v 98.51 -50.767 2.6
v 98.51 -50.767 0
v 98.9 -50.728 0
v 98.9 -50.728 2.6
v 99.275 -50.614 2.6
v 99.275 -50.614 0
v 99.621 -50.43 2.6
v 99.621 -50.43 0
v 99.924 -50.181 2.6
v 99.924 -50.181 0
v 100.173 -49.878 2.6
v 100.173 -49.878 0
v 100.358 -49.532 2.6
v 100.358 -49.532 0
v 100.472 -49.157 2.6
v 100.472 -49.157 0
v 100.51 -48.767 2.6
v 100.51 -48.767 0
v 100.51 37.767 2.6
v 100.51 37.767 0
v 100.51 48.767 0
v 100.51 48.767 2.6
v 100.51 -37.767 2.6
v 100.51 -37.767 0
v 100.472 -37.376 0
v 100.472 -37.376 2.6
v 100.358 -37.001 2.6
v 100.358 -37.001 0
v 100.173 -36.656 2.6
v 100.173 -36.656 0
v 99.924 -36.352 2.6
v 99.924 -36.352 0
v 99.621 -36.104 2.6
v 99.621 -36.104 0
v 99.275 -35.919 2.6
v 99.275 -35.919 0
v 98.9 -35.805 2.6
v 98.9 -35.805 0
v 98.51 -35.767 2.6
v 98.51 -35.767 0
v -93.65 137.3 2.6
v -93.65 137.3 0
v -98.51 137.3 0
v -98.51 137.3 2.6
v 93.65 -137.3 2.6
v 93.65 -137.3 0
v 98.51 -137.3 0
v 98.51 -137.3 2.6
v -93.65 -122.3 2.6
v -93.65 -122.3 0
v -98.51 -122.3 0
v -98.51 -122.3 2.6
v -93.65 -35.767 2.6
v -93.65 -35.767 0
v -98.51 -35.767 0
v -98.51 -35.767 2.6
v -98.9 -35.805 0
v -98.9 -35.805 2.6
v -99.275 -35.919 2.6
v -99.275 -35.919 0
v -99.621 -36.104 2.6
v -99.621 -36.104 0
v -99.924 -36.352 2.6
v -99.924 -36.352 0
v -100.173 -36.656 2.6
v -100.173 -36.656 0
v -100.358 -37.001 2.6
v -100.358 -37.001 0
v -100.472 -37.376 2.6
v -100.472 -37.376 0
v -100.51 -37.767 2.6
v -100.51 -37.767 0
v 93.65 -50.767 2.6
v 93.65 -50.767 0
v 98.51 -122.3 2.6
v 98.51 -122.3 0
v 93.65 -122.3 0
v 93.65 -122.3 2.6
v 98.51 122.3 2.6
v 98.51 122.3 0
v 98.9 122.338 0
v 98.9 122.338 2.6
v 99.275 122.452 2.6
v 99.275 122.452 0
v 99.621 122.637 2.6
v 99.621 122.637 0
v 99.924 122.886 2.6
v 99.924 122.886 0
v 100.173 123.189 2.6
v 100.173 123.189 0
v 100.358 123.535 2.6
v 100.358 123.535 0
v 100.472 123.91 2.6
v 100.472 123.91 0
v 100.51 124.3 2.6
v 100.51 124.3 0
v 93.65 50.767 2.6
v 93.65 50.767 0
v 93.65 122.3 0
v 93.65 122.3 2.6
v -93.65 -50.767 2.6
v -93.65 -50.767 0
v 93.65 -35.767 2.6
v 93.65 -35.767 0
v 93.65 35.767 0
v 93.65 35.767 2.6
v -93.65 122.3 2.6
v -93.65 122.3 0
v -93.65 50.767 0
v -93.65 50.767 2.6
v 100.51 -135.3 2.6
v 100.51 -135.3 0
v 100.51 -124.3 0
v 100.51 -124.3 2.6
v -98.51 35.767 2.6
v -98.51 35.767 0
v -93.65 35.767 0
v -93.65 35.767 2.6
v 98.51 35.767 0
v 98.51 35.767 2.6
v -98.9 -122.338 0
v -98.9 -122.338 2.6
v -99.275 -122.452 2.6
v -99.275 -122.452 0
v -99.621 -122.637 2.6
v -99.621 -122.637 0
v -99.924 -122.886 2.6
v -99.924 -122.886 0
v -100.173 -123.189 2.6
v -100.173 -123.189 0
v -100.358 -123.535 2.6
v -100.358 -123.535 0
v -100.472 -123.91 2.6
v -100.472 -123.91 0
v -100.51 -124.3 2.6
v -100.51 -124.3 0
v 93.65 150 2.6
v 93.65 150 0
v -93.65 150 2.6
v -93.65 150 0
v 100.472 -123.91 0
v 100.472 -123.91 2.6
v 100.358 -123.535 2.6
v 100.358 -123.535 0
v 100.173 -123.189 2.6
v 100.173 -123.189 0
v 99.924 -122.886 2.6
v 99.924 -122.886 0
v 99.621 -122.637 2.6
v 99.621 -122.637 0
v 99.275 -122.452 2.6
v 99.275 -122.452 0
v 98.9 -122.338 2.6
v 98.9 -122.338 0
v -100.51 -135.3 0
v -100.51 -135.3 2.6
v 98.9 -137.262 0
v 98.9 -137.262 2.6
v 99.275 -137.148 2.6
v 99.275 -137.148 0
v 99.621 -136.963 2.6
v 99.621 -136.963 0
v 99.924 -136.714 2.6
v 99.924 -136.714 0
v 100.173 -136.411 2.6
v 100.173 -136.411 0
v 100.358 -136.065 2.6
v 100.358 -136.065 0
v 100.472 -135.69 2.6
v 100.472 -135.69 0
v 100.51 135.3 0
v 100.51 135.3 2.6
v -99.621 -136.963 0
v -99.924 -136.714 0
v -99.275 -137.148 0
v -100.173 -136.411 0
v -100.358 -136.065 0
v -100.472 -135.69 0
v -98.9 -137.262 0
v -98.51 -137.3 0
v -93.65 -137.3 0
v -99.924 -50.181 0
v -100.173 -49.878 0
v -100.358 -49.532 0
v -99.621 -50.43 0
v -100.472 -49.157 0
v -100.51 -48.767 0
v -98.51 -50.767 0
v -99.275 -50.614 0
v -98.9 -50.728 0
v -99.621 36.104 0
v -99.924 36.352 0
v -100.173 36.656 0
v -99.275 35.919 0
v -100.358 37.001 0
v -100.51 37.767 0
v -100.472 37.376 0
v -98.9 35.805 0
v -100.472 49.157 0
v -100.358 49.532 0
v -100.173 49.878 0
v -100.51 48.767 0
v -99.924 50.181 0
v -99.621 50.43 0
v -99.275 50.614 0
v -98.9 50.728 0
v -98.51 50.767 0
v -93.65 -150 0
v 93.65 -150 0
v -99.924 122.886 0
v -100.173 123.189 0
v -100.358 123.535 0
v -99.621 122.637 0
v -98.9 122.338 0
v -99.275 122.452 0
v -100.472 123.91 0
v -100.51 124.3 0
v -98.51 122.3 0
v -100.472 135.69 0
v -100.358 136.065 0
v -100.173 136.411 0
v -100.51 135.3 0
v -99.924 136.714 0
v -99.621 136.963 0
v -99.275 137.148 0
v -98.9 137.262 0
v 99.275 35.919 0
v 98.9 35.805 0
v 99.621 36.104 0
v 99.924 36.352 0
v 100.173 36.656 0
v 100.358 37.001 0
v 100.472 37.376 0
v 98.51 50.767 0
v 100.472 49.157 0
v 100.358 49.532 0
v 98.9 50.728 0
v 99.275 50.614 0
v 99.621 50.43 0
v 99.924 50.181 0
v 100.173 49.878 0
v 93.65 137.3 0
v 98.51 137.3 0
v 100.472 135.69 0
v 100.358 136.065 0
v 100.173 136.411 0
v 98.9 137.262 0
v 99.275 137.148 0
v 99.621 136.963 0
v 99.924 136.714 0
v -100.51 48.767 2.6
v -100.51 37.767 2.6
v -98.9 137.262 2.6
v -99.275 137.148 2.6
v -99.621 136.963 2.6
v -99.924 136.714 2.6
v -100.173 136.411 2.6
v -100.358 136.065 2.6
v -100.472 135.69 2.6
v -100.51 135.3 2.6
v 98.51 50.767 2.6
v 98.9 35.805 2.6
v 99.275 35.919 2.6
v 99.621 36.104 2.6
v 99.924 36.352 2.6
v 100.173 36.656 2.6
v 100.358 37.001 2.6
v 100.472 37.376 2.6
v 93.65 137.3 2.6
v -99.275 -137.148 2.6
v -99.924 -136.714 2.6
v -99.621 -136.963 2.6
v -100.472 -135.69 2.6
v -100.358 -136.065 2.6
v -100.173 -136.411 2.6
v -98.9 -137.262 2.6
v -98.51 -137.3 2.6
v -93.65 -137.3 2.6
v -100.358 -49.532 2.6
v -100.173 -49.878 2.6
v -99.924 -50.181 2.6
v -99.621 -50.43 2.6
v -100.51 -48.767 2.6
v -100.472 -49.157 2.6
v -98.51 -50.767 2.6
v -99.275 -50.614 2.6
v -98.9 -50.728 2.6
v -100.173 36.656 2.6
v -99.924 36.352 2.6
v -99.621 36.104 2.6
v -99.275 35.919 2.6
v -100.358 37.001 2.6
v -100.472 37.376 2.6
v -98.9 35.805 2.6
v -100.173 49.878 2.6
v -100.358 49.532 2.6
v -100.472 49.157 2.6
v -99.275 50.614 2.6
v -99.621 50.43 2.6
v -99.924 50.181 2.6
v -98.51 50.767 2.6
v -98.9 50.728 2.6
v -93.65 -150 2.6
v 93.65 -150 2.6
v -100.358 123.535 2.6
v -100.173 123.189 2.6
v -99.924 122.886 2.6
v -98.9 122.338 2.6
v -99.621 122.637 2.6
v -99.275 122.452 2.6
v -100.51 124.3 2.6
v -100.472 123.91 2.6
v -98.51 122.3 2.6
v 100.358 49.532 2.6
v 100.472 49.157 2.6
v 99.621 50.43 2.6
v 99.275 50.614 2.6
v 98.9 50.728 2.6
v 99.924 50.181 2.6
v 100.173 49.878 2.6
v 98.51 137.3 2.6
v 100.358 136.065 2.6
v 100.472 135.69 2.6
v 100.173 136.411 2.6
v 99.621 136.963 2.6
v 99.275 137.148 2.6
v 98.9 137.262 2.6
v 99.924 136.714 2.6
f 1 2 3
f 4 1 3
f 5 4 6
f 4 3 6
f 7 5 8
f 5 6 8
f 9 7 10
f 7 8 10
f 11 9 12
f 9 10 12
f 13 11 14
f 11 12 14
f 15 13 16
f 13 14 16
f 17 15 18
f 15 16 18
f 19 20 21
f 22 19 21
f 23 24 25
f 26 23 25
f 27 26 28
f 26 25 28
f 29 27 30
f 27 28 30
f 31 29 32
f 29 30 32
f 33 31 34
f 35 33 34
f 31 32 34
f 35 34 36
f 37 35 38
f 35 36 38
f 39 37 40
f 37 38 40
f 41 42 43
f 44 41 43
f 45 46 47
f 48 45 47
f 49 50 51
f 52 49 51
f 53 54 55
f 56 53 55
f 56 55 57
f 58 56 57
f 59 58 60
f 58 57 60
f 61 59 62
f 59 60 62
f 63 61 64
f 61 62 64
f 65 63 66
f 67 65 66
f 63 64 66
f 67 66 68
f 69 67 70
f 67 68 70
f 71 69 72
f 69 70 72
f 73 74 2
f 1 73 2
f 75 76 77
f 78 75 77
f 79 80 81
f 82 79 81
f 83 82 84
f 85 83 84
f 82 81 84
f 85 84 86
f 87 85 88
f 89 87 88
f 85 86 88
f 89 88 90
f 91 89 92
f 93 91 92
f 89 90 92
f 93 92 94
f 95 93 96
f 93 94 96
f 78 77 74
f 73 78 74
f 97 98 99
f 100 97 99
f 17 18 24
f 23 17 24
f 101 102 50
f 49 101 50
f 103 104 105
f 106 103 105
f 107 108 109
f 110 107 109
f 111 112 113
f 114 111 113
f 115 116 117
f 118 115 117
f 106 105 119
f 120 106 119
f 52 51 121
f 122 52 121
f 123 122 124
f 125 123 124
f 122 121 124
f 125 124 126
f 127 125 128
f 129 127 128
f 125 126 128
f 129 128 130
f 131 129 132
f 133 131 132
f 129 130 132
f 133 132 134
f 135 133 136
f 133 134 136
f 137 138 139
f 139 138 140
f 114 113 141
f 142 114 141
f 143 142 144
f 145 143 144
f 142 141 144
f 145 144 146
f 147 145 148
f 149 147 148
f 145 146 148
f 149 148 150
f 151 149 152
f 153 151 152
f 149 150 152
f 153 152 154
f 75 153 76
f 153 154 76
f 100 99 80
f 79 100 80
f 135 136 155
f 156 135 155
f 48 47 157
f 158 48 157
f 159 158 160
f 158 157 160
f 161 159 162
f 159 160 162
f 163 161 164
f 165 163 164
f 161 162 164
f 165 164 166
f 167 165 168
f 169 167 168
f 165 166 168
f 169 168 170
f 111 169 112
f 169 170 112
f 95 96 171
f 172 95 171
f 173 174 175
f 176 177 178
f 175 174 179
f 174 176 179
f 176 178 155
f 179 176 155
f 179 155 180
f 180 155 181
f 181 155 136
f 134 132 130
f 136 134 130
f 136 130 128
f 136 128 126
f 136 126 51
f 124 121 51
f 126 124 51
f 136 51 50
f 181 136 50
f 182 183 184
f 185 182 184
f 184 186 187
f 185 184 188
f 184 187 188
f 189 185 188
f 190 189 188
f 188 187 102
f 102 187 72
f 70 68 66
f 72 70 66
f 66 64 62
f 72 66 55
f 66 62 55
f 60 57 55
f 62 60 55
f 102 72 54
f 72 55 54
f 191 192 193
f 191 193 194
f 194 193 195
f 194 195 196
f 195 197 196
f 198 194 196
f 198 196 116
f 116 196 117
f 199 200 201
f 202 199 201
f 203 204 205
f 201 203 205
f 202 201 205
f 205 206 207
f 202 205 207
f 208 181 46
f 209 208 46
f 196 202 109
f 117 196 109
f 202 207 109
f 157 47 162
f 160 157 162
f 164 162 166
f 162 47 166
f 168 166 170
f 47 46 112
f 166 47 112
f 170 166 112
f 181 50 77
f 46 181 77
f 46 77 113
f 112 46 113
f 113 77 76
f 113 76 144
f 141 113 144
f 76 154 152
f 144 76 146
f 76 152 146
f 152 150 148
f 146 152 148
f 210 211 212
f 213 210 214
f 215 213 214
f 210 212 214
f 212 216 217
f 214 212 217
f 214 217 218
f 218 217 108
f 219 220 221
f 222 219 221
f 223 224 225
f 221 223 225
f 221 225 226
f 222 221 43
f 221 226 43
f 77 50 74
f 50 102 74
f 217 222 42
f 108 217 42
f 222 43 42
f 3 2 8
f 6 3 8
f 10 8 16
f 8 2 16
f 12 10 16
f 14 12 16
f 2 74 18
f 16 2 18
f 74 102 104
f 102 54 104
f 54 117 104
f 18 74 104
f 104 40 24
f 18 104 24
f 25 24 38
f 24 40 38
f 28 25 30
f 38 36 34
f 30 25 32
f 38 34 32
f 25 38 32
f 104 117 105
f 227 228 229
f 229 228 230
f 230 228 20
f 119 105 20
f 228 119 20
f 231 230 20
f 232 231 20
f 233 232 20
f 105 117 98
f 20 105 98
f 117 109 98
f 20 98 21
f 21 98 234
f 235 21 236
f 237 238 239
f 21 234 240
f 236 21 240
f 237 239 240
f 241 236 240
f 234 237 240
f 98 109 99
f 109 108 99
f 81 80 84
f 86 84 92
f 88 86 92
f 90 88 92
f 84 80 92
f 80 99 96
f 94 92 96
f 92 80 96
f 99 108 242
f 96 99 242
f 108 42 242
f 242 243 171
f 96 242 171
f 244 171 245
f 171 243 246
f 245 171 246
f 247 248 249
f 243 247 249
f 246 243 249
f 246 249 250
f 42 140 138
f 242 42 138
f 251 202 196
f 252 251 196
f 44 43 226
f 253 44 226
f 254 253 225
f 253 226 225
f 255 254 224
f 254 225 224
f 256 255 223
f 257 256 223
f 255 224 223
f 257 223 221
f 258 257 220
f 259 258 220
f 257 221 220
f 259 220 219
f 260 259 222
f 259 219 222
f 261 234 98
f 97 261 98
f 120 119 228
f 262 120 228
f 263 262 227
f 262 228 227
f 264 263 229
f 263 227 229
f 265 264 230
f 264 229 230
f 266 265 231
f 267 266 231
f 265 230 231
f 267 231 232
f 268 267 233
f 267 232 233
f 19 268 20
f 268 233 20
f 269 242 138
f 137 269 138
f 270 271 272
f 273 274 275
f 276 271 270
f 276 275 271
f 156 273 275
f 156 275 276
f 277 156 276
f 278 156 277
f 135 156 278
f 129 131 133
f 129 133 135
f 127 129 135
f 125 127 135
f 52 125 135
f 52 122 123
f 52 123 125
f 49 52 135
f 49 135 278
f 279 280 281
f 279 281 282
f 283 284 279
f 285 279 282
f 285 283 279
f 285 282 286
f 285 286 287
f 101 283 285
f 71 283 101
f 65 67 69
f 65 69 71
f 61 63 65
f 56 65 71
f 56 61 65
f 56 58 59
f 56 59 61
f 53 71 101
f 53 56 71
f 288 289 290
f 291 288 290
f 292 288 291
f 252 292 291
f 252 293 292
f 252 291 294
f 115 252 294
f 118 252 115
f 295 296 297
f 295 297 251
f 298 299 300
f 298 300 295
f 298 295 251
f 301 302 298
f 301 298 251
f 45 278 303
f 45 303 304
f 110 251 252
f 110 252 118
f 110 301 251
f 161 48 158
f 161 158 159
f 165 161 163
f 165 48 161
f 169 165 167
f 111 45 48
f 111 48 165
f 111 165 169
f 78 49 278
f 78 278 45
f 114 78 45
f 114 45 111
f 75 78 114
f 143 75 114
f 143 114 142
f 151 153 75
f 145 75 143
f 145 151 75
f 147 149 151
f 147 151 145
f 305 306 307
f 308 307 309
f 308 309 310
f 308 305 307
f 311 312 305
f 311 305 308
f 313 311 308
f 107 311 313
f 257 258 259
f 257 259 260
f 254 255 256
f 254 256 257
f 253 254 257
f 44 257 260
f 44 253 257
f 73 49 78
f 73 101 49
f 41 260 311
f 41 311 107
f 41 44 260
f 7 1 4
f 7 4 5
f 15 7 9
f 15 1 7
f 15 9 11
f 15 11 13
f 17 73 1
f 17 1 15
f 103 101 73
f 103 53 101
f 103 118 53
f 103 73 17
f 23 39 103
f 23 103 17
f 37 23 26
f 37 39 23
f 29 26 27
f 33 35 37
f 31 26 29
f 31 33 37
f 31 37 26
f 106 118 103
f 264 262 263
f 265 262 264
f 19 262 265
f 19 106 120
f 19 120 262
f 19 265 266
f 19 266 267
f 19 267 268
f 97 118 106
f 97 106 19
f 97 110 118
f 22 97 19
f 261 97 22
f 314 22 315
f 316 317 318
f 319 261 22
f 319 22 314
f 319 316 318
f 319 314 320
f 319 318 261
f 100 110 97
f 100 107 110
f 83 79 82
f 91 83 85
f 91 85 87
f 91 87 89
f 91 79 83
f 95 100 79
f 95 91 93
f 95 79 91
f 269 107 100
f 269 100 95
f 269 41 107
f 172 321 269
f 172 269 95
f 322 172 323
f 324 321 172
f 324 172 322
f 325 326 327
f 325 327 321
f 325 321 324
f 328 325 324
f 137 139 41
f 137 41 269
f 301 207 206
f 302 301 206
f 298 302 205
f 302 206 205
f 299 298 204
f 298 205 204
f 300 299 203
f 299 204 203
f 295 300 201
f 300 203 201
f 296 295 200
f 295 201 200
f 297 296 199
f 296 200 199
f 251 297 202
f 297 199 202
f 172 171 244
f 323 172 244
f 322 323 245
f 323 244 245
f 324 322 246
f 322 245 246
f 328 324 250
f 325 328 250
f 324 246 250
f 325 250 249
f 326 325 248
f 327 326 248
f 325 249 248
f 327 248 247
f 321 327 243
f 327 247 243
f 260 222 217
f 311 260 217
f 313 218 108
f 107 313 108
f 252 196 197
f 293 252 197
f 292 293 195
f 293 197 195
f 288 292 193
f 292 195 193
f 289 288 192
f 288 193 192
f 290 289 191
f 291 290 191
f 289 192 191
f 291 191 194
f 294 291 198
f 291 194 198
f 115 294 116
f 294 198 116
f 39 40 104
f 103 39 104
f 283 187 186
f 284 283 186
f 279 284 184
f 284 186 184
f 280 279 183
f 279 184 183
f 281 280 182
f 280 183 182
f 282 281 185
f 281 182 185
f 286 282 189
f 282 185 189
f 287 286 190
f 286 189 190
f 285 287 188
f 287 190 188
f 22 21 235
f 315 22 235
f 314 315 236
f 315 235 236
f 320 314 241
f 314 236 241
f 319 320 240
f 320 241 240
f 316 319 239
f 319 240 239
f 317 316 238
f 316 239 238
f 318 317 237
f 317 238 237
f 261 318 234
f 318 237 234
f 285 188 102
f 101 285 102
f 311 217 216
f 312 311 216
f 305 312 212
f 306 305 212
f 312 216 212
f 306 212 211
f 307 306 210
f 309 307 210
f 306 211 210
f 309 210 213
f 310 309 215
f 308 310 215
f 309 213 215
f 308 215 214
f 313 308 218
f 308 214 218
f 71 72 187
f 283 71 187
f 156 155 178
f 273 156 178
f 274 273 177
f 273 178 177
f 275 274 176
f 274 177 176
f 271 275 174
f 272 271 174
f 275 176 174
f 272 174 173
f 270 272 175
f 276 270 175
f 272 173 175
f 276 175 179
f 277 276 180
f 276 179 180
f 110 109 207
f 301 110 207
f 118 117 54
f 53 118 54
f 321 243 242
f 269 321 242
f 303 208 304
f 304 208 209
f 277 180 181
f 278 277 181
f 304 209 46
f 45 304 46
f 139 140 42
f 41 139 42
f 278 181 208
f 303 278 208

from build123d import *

# Parameters (mm, degrees)
BOSS_EXTRUDE1_DEPTH = 2.6


with BuildPart() as part:
    # Model → Boss-Extrude1 (new body)
    with BuildSketch(Plane.XY):
        with BuildLine():
            Line((93.65, 50.766666667), (93.65, 122.3))
            Line((93.65, 122.3), (98.51, 122.3))
            ThreePointArc((98.51, 122.3), (99.924213562, 122.885786438), (100.51, 124.3))
            Line((100.51, 124.3), (100.51, 135.3))
            ThreePointArc((100.51, 135.3), (99.924213562, 136.714213562), (98.51, 137.3))
            Line((98.51, 137.3), (93.65, 137.3))
            Line((93.65, 137.3), (93.65, 150))
            Line((93.65, 150), (-93.65, 150))
            Line((-93.65, 150), (-93.65, 137.3))
            Line((-93.65, 137.3), (-98.51, 137.3))
            ThreePointArc((-98.51, 137.3), (-99.924213562, 136.714213562), (-100.51, 135.3))
            Line((-100.51, 135.3), (-100.51, 124.3))
            ThreePointArc((-100.51, 124.3), (-99.924213562, 122.885786438), (-98.51, 122.3))
            Line((-98.51, 122.3), (-93.65, 122.3))
            Line((-93.65, 122.3), (-93.65, 50.766666667))
            Line((-93.65, 50.766666667), (-98.51, 50.766666667))
            ThreePointArc((-98.51, 50.766666667), (-99.924213562, 50.180880229), (-100.51, 48.766666667))
            Line((-100.51, 48.766666667), (-100.51, 37.766666667))
            ThreePointArc((-100.51, 37.766666667), (-99.924213562, 36.352453104), (-98.51, 35.766666667))
            Line((-98.51, 35.766666667), (-93.65, 35.766666667))
            Line((-93.65, 35.766666667), (-93.65, -35.766666667))
            Line((-93.65, -35.766666667), (-98.51, -35.766666667))
            ThreePointArc((-98.51, -35.766666667), (-99.924213562, -36.352453104), (-100.51, -37.766666667))
            Line((-100.51, -37.766666667), (-100.51, -48.766666667))
            ThreePointArc((-100.51, -48.766666667), (-99.924213562, -50.180880229), (-98.51, -50.766666667))
            Line((-98.51, -50.766666667), (-93.65, -50.766666667))
            Line((-93.65, -50.766666667), (-93.65, -122.3))
            Line((-93.65, -122.3), (-98.51, -122.3))
            ThreePointArc((-98.51, -122.3), (-99.924213562, -122.885786438), (-100.51, -124.3))
            Line((-100.51, -124.3), (-100.51, -135.3))
            ThreePointArc((-100.51, -135.3), (-99.924213562, -136.714213562), (-98.51, -137.3))
            Line((-98.51, -137.3), (-93.65, -137.3))
            Line((-93.65, -137.3), (-93.65, -150))
            Line((-93.65, -150), (93.65, -150))
            Line((93.65, -150), (93.65, -137.3))
            Line((93.65, -137.3), (98.51, -137.3))
            ThreePointArc((98.51, -137.3), (99.924213562, -136.714213562), (100.51, -135.3))
            Line((100.51, -135.3), (100.51, -124.3))
            ThreePointArc((100.51, -124.3), (99.924213562, -122.885786438), (98.51, -122.3))
            Line((98.51, -122.3), (93.65, -122.3))
            Line((93.65, -122.3), (93.65, -50.766666667))
            Line((93.65, -50.766666667), (98.51, -50.766666667))
            ThreePointArc((98.51, -50.766666667), (99.924213562, -50.180880229), (100.51, -48.766666667))
            Line((100.51, -48.766666667), (100.51, -37.766666667))
            ThreePointArc((100.51, -37.766666667), (99.924213562, -36.352453104), (98.51, -35.766666667))
            Line((98.51, -35.766666667), (93.65, -35.766666667))
            Line((93.65, -35.766666667), (93.65, 35.766666667))
            Line((93.65, 35.766666667), (98.51, 35.766666667))
            ThreePointArc((98.51, 35.766666667), (99.924213562, 36.352453104), (100.51, 37.766666667))
            Line((100.51, 37.766666667), (100.51, 48.766666667))
            ThreePointArc((100.51, 48.766666667), (99.924213562, 50.180880229), (98.51, 50.766666667))
            Line((98.51, 50.766666667), (93.65, 50.766666667))
        make_face()
    extrude(amount=BOSS_EXTRUDE1_DEPTH)


solid = part.part
